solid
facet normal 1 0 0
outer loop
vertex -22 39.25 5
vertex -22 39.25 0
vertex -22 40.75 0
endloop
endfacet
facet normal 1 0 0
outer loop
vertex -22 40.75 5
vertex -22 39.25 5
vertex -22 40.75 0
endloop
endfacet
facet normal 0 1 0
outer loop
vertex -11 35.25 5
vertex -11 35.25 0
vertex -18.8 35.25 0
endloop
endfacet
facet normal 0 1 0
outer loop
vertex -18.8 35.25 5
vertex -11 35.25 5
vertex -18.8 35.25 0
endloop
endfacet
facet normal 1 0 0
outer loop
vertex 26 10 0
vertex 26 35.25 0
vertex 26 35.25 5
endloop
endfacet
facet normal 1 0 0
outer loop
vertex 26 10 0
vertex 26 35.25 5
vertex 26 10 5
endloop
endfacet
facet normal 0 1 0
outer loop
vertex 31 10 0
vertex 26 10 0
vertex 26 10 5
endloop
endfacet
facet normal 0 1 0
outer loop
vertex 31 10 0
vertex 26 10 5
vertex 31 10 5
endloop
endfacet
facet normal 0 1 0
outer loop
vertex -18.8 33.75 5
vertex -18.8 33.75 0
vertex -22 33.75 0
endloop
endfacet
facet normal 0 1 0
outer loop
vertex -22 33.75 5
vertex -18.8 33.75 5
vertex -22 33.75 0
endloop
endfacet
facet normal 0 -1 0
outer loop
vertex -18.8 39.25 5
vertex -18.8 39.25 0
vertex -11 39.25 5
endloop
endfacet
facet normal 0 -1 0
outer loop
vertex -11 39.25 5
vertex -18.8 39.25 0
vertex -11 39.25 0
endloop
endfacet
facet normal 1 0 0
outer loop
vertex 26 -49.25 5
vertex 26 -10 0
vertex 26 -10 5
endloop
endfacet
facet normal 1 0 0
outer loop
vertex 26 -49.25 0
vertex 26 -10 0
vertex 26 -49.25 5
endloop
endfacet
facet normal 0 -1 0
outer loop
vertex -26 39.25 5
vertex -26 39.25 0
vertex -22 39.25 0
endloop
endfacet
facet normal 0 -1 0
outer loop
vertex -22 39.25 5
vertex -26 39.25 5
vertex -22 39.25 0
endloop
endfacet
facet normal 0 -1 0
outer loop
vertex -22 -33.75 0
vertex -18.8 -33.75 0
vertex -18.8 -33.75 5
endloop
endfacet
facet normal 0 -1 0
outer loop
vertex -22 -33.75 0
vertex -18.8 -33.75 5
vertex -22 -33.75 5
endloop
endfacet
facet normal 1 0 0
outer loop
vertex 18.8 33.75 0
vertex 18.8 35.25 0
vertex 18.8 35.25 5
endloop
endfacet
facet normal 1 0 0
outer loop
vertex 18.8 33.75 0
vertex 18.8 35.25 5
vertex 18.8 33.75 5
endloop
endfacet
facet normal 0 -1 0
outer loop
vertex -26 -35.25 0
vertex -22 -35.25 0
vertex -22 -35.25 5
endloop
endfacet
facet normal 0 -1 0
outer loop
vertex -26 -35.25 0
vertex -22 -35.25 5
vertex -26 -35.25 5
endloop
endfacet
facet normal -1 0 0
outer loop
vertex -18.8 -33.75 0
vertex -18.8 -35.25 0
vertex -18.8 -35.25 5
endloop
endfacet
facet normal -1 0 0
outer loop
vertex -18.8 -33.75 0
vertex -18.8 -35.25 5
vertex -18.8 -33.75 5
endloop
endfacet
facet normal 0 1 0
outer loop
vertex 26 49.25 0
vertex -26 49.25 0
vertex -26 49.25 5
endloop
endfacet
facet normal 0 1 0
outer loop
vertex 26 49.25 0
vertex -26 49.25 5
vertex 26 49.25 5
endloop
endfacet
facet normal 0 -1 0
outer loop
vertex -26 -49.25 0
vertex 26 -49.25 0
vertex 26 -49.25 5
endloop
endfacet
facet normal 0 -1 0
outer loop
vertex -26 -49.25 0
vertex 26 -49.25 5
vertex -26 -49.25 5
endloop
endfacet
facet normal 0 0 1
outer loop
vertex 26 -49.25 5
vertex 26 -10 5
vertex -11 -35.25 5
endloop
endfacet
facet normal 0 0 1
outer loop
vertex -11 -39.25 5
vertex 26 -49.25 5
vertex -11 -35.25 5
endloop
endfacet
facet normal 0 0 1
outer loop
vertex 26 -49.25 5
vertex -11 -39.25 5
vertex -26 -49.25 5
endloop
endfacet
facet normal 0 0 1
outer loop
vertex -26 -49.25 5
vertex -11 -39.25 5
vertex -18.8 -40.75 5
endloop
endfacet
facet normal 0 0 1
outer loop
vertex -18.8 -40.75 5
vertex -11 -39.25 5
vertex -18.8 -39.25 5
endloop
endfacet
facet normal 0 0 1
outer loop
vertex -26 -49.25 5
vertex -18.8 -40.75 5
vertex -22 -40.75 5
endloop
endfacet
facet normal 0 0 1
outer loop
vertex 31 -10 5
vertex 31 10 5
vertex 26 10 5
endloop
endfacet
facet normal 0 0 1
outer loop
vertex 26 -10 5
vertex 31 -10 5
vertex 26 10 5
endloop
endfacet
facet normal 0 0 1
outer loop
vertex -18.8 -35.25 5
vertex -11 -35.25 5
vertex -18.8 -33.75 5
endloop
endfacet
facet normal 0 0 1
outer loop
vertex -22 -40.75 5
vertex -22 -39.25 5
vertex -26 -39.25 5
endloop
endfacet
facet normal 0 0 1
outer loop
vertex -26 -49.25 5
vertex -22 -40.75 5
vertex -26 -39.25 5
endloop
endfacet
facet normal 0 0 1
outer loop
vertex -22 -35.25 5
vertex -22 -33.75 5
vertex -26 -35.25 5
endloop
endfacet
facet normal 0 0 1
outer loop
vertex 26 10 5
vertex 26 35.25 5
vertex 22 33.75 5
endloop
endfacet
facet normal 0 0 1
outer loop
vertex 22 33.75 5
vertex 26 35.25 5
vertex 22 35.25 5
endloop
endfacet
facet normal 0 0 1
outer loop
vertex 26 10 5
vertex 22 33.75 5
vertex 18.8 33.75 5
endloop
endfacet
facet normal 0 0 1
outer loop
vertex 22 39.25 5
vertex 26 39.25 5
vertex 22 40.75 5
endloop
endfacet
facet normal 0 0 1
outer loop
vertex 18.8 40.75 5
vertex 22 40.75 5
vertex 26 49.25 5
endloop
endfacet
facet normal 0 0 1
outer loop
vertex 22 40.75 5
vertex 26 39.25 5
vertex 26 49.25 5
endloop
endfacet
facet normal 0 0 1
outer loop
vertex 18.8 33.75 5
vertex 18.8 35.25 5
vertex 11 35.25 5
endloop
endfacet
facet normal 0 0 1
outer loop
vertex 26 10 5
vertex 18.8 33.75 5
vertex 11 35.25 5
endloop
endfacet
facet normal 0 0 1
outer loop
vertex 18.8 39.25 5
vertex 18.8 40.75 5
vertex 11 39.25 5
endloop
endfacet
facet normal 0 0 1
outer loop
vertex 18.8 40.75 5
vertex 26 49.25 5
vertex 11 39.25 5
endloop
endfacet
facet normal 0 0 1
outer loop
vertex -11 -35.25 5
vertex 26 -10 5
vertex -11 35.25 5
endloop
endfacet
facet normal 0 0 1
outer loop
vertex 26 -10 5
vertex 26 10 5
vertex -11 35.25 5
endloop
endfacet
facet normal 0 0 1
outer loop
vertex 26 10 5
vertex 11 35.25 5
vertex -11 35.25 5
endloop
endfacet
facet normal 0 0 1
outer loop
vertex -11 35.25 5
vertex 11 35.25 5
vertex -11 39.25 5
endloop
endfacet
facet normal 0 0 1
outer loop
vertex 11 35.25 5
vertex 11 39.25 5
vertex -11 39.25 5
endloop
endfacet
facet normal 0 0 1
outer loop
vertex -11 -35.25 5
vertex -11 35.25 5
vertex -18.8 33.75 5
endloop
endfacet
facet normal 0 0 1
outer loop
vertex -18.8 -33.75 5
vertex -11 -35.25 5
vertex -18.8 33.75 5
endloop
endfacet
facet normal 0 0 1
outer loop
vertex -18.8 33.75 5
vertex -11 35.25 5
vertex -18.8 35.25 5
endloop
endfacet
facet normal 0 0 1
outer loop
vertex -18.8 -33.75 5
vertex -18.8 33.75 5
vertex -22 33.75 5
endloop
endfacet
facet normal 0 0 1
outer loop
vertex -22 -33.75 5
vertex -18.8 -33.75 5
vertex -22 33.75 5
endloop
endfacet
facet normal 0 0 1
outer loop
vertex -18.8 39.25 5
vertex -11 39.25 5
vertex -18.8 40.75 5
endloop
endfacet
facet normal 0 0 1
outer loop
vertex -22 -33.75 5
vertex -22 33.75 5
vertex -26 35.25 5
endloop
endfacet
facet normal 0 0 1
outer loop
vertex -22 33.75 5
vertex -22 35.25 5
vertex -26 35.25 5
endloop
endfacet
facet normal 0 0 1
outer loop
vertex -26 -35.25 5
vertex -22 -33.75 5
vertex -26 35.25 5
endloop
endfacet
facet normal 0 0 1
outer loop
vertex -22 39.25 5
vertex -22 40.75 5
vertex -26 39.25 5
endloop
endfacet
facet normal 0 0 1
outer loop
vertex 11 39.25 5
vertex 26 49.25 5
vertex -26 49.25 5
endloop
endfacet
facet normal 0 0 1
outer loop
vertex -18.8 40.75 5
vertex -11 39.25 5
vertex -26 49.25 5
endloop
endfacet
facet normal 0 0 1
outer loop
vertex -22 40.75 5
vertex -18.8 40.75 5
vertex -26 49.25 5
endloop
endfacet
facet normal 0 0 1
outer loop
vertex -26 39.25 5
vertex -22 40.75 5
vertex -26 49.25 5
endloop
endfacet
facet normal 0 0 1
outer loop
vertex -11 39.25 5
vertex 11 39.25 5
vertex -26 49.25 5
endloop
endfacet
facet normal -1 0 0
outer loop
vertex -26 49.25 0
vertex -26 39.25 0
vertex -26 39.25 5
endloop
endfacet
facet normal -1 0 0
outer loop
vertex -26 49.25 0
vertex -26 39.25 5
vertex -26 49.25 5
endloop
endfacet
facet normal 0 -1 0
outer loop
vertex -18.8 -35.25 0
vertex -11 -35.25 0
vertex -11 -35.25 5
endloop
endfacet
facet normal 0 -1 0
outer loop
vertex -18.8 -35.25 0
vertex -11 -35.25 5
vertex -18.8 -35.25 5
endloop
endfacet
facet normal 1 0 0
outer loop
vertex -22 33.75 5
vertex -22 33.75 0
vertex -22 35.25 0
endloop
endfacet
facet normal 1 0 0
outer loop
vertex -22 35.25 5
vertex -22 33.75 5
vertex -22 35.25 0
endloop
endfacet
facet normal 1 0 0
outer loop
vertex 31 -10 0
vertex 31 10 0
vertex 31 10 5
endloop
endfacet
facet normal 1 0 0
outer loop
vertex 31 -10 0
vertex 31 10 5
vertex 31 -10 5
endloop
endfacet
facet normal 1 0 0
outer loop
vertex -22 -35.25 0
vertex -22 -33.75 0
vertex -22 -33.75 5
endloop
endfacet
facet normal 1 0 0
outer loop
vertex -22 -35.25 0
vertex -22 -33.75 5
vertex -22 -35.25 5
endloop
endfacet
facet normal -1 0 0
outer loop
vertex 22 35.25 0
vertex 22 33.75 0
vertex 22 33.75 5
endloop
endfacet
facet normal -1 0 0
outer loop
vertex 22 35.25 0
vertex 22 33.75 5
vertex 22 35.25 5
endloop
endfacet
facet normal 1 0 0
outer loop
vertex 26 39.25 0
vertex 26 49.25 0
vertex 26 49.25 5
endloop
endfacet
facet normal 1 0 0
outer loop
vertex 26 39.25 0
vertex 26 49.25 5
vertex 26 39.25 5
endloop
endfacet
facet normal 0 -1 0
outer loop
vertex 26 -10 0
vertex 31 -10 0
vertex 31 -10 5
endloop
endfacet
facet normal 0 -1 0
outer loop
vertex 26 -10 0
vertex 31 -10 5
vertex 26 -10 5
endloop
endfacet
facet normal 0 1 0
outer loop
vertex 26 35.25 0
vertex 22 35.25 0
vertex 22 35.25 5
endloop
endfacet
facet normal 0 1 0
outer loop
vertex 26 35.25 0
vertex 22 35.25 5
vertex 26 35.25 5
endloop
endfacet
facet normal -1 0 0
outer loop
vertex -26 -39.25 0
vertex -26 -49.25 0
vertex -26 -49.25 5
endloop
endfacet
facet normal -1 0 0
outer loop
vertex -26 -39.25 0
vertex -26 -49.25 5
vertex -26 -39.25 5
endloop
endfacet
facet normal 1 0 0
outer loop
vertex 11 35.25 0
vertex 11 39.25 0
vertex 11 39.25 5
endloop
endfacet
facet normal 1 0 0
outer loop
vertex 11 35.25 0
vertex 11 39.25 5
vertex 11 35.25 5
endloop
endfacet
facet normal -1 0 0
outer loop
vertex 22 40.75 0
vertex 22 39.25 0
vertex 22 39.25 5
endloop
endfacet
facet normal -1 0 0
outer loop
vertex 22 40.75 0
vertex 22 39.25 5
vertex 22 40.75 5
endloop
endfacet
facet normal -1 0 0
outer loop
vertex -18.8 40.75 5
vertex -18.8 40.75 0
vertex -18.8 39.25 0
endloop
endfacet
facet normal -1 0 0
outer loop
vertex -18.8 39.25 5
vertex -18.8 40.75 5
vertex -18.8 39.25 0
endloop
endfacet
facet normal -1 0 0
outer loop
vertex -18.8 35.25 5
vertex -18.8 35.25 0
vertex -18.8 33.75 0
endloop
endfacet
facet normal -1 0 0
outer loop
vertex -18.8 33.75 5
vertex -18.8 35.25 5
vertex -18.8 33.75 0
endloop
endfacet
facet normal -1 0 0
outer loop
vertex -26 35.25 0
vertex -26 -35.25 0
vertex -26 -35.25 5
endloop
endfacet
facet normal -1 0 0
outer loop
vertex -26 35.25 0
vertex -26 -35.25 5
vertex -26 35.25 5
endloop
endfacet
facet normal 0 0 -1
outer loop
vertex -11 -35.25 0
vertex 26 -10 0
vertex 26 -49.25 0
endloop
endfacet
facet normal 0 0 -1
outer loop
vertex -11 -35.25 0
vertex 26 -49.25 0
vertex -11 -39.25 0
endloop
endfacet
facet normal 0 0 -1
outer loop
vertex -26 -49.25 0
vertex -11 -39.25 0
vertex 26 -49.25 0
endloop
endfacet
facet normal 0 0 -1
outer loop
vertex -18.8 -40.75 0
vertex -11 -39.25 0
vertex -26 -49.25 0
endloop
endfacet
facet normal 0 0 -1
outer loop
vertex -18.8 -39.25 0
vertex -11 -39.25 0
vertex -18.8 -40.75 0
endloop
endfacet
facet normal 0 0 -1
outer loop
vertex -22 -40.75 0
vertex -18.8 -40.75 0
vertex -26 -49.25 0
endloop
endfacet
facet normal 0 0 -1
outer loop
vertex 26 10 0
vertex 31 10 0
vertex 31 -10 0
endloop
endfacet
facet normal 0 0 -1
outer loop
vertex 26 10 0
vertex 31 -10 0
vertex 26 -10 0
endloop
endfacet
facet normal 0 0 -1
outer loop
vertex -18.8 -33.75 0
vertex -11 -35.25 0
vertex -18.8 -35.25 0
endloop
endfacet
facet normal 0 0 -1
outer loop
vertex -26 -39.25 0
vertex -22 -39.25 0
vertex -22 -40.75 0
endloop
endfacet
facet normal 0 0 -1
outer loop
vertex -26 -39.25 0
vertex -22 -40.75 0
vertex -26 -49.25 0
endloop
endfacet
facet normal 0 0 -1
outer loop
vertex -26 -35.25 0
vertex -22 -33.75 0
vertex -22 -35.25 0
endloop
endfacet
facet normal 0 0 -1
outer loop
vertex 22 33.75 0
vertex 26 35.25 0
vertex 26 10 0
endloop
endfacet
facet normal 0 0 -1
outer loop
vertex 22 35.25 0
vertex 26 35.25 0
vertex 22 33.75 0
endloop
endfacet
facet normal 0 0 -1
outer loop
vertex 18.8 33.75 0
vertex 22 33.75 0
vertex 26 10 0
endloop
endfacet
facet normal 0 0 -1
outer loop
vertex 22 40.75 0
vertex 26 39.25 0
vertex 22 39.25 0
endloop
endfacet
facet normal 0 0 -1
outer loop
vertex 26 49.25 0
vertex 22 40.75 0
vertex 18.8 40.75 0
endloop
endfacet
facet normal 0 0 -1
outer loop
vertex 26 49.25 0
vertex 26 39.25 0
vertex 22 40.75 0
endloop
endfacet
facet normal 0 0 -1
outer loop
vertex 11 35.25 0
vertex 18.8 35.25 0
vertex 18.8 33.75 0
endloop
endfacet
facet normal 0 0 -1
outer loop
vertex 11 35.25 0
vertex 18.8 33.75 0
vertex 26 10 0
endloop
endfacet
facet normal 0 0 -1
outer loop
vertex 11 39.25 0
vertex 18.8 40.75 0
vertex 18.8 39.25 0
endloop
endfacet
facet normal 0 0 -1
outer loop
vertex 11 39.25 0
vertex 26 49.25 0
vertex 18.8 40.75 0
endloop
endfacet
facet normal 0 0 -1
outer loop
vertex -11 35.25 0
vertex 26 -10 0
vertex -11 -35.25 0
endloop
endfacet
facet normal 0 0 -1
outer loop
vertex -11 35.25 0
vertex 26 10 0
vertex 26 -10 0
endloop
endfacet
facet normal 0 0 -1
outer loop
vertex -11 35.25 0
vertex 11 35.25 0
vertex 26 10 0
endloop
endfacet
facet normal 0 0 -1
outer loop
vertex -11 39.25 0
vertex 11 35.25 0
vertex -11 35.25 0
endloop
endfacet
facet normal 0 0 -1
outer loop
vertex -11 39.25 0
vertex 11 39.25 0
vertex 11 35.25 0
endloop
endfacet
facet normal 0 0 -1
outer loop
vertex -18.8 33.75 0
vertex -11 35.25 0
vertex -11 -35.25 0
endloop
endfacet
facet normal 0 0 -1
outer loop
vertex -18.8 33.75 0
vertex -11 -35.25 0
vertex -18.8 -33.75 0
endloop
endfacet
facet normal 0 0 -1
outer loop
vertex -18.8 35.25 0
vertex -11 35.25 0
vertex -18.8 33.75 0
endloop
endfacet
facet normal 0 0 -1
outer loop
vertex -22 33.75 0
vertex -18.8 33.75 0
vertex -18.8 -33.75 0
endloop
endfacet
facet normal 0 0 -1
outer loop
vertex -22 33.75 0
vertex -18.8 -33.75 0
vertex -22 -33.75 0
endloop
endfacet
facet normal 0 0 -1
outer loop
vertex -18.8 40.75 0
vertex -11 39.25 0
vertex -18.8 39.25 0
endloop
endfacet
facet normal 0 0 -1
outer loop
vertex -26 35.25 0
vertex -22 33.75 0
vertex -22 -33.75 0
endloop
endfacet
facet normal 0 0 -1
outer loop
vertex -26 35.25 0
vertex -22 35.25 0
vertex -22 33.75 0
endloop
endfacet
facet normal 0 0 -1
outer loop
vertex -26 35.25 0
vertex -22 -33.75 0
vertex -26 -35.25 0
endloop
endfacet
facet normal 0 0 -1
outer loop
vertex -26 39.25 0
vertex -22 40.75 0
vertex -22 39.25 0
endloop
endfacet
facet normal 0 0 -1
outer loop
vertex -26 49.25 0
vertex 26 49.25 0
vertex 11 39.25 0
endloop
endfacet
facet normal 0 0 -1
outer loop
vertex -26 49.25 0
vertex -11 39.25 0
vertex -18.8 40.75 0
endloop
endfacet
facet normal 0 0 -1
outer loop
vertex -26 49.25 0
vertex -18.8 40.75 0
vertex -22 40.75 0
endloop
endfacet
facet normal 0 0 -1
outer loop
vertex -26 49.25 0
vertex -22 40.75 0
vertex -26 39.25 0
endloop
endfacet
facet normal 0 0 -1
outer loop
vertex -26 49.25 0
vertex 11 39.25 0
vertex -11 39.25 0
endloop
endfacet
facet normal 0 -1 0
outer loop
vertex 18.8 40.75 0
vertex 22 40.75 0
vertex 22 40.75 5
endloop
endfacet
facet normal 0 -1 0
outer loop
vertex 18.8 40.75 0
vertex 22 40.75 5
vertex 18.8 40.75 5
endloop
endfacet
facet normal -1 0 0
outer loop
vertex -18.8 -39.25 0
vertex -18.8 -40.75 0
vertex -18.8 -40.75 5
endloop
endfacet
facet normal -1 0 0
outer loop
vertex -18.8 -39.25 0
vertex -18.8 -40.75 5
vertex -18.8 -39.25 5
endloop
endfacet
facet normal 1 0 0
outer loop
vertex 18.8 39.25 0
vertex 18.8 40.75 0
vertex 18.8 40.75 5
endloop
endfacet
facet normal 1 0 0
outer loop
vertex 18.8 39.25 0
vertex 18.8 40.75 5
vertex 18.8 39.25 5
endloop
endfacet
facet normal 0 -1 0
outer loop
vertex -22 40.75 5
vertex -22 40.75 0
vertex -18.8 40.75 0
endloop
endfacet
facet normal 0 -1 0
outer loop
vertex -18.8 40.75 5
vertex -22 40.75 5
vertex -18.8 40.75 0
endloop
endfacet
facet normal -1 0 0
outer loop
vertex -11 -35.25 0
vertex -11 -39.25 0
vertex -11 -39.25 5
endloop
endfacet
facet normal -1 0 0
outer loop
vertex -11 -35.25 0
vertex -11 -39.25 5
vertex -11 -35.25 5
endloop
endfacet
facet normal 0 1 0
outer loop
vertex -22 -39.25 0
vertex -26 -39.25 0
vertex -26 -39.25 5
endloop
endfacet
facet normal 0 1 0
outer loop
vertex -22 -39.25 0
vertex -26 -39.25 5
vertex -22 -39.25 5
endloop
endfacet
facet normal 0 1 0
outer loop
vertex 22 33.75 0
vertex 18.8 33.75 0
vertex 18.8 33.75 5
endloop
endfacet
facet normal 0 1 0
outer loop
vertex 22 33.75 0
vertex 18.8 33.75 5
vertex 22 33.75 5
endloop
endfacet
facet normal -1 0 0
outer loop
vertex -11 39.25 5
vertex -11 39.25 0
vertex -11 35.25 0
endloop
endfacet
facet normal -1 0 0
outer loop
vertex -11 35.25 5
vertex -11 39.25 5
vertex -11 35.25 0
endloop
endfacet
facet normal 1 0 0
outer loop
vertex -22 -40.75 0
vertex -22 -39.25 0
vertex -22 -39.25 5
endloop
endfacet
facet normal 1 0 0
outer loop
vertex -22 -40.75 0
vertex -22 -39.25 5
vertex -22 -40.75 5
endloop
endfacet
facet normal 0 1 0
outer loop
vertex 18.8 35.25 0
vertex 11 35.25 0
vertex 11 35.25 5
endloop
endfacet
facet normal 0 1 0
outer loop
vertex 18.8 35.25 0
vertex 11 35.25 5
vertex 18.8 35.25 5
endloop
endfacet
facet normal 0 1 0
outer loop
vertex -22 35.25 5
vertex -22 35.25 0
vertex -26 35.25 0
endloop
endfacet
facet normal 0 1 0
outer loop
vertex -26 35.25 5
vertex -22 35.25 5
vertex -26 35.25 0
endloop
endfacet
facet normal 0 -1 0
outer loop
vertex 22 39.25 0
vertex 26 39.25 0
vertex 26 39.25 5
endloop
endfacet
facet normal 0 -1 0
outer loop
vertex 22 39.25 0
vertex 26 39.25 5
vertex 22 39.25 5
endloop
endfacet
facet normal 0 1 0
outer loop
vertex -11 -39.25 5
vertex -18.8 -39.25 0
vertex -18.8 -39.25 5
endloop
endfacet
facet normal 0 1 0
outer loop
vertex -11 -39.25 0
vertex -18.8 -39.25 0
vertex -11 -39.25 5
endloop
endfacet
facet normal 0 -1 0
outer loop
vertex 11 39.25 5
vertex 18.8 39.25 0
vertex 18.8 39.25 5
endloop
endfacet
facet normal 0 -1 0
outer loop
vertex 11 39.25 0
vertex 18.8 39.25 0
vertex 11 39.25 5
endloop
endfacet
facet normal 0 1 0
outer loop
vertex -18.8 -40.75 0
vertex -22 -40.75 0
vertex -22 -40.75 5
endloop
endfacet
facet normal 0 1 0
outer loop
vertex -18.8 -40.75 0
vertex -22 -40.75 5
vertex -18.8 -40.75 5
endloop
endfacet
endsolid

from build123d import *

# Parameters (mm, degrees)
BOSS_EXTRUDE1_DEPTH = 5
CUT_EXTRUDE1_DEPTH  = 10


with BuildPart() as part:
    # Sketch1 → Boss-Extrude1 (new body)
    with BuildSketch(Plane.XY):
        Polygon((26, 10), (31, 10), (31, -10), (26, -10), (26, -49.25), (-26, -49.25), (-26, 49.25), (26, 49.25), align=None)
    extrude(amount=BOSS_EXTRUDE1_DEPTH)

    # Sketch2 → Cut-Extrude1 (cut)
    with BuildSketch(Plane(origin=(0, 0, 0), x_dir=(-1, 0, 0), z_dir=(0, 0, -1))):
        Polygon((26, 39.25), (22, 39.25), (22, 40.75), (18.8, 40.75), (18.8, 39.25), (11, 39.25), (11, 35.25), (18.8, 35.25), (18.8, 33.75), (22, 33.75), (22, 35.25), (26, 35.25), align=None)
        Polygon((26, -35.25), (26, -39.25), (22, -39.25), (22, -40.75), (18.8, -40.75), (18.8, -39.25), (11, -39.25), (11, -35.25), (18.8, -35.25), (18.8, -33.75), (22, -33.75), (22, -35.25), align=None)
        Polygon((-26, 35.25), (-26, 39.25), (-22, 39.25), (-22, 40.75), (-18.8, 40.75), (-18.8, 39.25), (-11, 39.25), (-11, 35.25), (-18.8, 35.25), (-18.8, 33.75), (-22, 33.75), (-22, 35.25), align=None)
    extrude(amount=-CUT_EXTRUDE1_DEPTH, mode=Mode.SUBTRACT)


solid = part.part
